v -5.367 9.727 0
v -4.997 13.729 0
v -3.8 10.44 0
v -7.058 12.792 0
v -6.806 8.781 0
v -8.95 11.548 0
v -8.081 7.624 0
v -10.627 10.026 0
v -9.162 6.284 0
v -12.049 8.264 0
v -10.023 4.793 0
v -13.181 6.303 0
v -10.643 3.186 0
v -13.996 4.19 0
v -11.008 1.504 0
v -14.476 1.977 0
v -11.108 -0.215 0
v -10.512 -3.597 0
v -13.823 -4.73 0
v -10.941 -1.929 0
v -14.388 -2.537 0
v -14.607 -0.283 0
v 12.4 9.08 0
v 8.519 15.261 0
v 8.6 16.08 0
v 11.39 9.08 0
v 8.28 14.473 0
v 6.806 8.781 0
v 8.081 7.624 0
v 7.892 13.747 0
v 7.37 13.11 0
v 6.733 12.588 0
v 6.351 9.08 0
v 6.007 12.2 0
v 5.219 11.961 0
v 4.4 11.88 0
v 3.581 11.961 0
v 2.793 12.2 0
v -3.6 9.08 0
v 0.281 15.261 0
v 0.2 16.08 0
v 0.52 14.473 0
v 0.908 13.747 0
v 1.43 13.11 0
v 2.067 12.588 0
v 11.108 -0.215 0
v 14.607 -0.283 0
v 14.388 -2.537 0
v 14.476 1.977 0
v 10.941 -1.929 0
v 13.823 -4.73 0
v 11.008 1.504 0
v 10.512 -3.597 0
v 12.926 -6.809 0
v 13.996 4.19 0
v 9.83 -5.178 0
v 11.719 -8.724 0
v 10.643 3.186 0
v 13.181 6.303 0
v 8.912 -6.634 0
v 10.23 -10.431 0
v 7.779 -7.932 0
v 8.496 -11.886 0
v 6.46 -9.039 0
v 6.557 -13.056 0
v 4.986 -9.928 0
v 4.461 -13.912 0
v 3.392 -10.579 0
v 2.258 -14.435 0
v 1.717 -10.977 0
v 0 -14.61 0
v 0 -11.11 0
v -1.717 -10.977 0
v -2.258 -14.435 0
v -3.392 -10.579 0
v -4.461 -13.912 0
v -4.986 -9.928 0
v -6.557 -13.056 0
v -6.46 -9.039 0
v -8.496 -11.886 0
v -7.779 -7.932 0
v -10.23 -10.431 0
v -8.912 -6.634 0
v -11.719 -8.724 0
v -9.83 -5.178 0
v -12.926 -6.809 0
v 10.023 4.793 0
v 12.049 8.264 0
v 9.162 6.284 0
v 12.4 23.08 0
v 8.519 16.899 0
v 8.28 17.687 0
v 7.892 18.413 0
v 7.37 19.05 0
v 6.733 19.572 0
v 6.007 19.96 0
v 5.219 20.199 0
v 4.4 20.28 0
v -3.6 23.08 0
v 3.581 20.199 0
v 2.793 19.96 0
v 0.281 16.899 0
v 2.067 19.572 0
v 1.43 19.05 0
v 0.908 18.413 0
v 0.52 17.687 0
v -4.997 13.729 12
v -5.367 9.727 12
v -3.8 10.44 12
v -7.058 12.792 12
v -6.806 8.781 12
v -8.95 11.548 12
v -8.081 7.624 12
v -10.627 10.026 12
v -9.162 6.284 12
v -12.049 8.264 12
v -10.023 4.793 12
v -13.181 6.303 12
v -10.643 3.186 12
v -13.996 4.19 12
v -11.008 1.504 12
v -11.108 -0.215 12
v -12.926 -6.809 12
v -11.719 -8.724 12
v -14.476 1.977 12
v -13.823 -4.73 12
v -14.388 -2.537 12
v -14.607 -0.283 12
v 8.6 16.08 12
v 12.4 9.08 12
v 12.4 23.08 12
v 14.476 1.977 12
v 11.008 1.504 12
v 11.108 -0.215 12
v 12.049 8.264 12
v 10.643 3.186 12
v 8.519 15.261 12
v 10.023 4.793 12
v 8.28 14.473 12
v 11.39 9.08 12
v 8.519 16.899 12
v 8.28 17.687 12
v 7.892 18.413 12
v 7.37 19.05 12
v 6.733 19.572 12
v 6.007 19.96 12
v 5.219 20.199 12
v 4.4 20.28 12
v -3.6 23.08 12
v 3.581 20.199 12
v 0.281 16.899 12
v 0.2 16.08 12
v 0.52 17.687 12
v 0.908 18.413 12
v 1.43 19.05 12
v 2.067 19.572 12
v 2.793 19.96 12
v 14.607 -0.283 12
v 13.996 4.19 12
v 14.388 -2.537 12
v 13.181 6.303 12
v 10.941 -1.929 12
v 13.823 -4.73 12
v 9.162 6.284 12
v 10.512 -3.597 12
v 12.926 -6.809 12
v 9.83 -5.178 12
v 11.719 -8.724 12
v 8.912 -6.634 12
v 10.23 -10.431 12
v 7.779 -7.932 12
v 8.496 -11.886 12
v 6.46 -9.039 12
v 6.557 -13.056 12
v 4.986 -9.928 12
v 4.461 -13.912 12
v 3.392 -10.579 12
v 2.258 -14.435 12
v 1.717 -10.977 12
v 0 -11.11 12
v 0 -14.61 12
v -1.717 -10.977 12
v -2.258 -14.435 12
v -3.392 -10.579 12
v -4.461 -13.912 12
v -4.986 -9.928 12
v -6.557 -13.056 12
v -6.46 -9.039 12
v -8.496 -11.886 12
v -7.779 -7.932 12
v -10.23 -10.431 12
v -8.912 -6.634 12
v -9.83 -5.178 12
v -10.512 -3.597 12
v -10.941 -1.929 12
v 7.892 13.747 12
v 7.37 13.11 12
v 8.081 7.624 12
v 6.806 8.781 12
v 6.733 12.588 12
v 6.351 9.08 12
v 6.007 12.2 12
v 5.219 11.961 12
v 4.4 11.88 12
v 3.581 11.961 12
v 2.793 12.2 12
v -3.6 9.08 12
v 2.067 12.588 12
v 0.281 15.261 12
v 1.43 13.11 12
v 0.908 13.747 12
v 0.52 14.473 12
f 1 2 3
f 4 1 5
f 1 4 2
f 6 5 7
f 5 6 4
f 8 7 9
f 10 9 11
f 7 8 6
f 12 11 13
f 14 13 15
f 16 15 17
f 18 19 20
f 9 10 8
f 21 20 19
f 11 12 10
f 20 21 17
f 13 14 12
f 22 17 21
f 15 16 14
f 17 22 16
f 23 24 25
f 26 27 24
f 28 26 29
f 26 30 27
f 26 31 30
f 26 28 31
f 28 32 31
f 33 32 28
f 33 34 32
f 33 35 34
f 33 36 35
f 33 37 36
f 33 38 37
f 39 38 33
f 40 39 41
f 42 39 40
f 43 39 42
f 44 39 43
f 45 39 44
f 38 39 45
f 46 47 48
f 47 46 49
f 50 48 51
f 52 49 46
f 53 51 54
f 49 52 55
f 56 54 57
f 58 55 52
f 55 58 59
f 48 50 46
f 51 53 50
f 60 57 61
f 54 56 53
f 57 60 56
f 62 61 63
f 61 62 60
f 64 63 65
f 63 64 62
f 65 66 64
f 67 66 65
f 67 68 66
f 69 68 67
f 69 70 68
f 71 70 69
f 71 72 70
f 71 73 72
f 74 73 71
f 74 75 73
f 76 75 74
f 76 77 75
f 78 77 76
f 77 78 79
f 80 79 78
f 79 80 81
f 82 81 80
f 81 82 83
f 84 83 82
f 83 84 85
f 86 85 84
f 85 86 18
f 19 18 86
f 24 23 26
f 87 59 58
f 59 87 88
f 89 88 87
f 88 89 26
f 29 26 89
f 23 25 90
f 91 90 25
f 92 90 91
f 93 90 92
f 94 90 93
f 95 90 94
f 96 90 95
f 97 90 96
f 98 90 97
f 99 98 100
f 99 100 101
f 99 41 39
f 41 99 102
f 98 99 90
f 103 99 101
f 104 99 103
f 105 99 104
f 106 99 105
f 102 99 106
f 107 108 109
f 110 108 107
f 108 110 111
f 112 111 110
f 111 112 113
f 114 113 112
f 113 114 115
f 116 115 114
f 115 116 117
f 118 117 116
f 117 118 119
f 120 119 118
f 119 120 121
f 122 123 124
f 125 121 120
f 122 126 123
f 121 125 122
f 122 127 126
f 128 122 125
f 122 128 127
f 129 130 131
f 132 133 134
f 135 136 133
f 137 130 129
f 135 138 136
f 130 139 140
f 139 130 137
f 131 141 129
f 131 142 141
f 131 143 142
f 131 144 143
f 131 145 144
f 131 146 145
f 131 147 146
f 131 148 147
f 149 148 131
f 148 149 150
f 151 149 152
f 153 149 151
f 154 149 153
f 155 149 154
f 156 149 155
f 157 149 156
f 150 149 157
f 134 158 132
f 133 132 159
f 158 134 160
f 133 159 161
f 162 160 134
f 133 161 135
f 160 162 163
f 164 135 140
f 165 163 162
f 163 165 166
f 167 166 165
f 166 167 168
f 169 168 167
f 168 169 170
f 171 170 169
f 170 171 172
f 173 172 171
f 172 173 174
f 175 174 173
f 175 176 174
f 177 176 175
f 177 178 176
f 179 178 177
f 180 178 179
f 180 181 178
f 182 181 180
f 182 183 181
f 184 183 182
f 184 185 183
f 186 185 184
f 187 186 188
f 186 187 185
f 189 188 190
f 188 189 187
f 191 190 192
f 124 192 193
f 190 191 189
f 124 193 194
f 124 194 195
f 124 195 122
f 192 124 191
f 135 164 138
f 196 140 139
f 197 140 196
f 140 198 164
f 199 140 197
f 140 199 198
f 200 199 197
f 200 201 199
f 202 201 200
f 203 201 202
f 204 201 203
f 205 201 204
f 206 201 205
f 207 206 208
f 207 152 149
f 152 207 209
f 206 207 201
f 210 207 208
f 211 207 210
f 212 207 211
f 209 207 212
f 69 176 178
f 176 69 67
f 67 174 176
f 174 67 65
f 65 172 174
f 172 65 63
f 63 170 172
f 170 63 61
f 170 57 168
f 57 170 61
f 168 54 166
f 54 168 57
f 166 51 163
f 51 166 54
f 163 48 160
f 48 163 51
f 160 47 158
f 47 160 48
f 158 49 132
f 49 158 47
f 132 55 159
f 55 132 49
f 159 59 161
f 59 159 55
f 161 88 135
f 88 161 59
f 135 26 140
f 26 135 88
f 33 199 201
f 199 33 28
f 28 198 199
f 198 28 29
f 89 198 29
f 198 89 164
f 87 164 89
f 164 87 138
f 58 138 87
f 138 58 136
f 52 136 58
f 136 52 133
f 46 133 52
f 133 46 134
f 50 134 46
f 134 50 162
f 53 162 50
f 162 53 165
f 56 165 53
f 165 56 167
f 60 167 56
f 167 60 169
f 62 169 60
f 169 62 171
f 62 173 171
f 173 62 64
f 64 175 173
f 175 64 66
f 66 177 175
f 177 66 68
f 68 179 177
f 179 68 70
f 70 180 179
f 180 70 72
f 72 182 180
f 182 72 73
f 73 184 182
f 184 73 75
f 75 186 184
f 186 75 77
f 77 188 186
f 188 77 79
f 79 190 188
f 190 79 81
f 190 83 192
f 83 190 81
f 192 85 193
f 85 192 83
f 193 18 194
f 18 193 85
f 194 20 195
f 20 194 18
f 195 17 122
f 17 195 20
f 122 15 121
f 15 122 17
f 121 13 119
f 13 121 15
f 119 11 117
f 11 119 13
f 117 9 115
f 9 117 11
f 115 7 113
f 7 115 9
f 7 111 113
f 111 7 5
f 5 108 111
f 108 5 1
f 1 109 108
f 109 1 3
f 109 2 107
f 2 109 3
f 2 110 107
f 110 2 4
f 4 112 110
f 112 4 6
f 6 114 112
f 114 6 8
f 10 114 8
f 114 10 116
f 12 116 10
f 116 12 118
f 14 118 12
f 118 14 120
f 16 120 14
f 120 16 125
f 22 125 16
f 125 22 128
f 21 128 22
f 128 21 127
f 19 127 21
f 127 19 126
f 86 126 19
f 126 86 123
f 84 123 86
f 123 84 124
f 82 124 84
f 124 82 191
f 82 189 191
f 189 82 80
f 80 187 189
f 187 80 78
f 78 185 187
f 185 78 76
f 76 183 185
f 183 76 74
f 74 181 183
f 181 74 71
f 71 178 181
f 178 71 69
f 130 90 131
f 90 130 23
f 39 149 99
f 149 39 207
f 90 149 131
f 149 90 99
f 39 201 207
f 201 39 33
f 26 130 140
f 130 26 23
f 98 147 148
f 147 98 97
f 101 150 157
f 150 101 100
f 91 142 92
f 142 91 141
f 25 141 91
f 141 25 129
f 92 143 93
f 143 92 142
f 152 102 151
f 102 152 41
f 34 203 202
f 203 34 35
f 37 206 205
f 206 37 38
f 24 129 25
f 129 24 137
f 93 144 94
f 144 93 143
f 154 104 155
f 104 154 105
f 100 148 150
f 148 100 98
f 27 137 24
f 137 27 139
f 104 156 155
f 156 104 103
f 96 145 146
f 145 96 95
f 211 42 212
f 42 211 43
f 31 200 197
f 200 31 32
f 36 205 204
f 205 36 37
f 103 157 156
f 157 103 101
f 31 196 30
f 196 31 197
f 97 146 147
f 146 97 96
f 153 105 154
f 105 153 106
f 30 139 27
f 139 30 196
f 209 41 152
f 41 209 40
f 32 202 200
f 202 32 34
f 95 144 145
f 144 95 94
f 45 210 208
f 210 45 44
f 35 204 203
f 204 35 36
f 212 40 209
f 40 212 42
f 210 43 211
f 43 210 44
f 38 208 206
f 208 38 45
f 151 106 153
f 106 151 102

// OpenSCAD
$fn = 32;

// ----------------------------------------------------------------------
// Pipe clamp: 29.22 mm ring, 3.5 mm wall, 12 mm wide
// ----------------------------------------------------------------------

// --- parameters (mm) ---
outer_r = 14.61;          // clamp outside radius
inner_r = 11.11;          // pipe bore radius
band = 3.5;               // band thickness
clamp_w = 12;             // clamp width
opening = 40;             // opening angle between the ends
lug_w = 16;               // lug width
lug_len = 14;             // lug length
bolt_d = 8.4;             // bolt hole

clamp_profile = [[-4.997, 13.729], [-7.058, 12.792], [-8.95, 11.548], [-10.627, 10.026], [-12.049, 8.264], [-13.181, 6.303], [-13.996, 4.19], [-14.476, 1.977], [-14.607, -0.283], [-14.388, -2.537], [-13.823, -4.73], [-12.926, -6.809], [-11.719, -8.724], [-10.23, -10.431], [-8.496, -11.886], [-6.557, -13.056], [-4.461, -13.912], [-2.258, -14.435], [0, -14.61], [2.258, -14.435], [4.461, -13.912], [6.557, -13.056], [8.496, -11.886], [10.23, -10.431], [11.719, -8.724], [12.926, -6.809], [13.823, -4.73], [14.388, -2.537], [14.607, -0.283], [14.476, 1.977], [13.996, 4.19], [13.181, 6.303], [12.049, 8.264], [10.627, 10.026], [8.95, 11.548], [7.058, 12.792], [4.997, 13.729], [3.8, 10.44], [5.367, 9.727], [6.806, 8.781], [8.081, 7.624], [9.162, 6.284], [10.023, 4.793], [10.643, 3.186], [11.008, 1.504], [11.108, -0.215], [10.941, -1.929], [10.512, -3.597], [9.83, -5.178], [8.912, -6.634], [7.779, -7.932], [6.46, -9.039], [4.986, -9.928], [3.392, -10.579], [1.717, -10.977], [0, -11.11], [-1.717, -10.977], [-3.392, -10.579], [-4.986, -9.928], [-6.46, -9.039], [-7.779, -7.932], [-8.912, -6.634], [-9.83, -5.178], [-10.512, -3.597], [-10.941, -1.929], [-11.108, -0.215], [-11.008, 1.504], [-10.643, 3.186], [-10.023, 4.793], [-9.162, 6.284], [-8.081, 7.624], [-6.806, 8.781], [-5.367, 9.727], [-3.8, 10.44]];

difference() {
  union() {
    linear_extrude(height = clamp_w) polygon(clamp_profile);
    /* bolt lug on the other end */
    translate([-3.6, 9.08, 0]) cube([lug_w, 14, clamp_w]);
  }
  translate([4.4, 16.08, -2.5]) cylinder(h = clamp_w + 5, d = bolt_d);
}
